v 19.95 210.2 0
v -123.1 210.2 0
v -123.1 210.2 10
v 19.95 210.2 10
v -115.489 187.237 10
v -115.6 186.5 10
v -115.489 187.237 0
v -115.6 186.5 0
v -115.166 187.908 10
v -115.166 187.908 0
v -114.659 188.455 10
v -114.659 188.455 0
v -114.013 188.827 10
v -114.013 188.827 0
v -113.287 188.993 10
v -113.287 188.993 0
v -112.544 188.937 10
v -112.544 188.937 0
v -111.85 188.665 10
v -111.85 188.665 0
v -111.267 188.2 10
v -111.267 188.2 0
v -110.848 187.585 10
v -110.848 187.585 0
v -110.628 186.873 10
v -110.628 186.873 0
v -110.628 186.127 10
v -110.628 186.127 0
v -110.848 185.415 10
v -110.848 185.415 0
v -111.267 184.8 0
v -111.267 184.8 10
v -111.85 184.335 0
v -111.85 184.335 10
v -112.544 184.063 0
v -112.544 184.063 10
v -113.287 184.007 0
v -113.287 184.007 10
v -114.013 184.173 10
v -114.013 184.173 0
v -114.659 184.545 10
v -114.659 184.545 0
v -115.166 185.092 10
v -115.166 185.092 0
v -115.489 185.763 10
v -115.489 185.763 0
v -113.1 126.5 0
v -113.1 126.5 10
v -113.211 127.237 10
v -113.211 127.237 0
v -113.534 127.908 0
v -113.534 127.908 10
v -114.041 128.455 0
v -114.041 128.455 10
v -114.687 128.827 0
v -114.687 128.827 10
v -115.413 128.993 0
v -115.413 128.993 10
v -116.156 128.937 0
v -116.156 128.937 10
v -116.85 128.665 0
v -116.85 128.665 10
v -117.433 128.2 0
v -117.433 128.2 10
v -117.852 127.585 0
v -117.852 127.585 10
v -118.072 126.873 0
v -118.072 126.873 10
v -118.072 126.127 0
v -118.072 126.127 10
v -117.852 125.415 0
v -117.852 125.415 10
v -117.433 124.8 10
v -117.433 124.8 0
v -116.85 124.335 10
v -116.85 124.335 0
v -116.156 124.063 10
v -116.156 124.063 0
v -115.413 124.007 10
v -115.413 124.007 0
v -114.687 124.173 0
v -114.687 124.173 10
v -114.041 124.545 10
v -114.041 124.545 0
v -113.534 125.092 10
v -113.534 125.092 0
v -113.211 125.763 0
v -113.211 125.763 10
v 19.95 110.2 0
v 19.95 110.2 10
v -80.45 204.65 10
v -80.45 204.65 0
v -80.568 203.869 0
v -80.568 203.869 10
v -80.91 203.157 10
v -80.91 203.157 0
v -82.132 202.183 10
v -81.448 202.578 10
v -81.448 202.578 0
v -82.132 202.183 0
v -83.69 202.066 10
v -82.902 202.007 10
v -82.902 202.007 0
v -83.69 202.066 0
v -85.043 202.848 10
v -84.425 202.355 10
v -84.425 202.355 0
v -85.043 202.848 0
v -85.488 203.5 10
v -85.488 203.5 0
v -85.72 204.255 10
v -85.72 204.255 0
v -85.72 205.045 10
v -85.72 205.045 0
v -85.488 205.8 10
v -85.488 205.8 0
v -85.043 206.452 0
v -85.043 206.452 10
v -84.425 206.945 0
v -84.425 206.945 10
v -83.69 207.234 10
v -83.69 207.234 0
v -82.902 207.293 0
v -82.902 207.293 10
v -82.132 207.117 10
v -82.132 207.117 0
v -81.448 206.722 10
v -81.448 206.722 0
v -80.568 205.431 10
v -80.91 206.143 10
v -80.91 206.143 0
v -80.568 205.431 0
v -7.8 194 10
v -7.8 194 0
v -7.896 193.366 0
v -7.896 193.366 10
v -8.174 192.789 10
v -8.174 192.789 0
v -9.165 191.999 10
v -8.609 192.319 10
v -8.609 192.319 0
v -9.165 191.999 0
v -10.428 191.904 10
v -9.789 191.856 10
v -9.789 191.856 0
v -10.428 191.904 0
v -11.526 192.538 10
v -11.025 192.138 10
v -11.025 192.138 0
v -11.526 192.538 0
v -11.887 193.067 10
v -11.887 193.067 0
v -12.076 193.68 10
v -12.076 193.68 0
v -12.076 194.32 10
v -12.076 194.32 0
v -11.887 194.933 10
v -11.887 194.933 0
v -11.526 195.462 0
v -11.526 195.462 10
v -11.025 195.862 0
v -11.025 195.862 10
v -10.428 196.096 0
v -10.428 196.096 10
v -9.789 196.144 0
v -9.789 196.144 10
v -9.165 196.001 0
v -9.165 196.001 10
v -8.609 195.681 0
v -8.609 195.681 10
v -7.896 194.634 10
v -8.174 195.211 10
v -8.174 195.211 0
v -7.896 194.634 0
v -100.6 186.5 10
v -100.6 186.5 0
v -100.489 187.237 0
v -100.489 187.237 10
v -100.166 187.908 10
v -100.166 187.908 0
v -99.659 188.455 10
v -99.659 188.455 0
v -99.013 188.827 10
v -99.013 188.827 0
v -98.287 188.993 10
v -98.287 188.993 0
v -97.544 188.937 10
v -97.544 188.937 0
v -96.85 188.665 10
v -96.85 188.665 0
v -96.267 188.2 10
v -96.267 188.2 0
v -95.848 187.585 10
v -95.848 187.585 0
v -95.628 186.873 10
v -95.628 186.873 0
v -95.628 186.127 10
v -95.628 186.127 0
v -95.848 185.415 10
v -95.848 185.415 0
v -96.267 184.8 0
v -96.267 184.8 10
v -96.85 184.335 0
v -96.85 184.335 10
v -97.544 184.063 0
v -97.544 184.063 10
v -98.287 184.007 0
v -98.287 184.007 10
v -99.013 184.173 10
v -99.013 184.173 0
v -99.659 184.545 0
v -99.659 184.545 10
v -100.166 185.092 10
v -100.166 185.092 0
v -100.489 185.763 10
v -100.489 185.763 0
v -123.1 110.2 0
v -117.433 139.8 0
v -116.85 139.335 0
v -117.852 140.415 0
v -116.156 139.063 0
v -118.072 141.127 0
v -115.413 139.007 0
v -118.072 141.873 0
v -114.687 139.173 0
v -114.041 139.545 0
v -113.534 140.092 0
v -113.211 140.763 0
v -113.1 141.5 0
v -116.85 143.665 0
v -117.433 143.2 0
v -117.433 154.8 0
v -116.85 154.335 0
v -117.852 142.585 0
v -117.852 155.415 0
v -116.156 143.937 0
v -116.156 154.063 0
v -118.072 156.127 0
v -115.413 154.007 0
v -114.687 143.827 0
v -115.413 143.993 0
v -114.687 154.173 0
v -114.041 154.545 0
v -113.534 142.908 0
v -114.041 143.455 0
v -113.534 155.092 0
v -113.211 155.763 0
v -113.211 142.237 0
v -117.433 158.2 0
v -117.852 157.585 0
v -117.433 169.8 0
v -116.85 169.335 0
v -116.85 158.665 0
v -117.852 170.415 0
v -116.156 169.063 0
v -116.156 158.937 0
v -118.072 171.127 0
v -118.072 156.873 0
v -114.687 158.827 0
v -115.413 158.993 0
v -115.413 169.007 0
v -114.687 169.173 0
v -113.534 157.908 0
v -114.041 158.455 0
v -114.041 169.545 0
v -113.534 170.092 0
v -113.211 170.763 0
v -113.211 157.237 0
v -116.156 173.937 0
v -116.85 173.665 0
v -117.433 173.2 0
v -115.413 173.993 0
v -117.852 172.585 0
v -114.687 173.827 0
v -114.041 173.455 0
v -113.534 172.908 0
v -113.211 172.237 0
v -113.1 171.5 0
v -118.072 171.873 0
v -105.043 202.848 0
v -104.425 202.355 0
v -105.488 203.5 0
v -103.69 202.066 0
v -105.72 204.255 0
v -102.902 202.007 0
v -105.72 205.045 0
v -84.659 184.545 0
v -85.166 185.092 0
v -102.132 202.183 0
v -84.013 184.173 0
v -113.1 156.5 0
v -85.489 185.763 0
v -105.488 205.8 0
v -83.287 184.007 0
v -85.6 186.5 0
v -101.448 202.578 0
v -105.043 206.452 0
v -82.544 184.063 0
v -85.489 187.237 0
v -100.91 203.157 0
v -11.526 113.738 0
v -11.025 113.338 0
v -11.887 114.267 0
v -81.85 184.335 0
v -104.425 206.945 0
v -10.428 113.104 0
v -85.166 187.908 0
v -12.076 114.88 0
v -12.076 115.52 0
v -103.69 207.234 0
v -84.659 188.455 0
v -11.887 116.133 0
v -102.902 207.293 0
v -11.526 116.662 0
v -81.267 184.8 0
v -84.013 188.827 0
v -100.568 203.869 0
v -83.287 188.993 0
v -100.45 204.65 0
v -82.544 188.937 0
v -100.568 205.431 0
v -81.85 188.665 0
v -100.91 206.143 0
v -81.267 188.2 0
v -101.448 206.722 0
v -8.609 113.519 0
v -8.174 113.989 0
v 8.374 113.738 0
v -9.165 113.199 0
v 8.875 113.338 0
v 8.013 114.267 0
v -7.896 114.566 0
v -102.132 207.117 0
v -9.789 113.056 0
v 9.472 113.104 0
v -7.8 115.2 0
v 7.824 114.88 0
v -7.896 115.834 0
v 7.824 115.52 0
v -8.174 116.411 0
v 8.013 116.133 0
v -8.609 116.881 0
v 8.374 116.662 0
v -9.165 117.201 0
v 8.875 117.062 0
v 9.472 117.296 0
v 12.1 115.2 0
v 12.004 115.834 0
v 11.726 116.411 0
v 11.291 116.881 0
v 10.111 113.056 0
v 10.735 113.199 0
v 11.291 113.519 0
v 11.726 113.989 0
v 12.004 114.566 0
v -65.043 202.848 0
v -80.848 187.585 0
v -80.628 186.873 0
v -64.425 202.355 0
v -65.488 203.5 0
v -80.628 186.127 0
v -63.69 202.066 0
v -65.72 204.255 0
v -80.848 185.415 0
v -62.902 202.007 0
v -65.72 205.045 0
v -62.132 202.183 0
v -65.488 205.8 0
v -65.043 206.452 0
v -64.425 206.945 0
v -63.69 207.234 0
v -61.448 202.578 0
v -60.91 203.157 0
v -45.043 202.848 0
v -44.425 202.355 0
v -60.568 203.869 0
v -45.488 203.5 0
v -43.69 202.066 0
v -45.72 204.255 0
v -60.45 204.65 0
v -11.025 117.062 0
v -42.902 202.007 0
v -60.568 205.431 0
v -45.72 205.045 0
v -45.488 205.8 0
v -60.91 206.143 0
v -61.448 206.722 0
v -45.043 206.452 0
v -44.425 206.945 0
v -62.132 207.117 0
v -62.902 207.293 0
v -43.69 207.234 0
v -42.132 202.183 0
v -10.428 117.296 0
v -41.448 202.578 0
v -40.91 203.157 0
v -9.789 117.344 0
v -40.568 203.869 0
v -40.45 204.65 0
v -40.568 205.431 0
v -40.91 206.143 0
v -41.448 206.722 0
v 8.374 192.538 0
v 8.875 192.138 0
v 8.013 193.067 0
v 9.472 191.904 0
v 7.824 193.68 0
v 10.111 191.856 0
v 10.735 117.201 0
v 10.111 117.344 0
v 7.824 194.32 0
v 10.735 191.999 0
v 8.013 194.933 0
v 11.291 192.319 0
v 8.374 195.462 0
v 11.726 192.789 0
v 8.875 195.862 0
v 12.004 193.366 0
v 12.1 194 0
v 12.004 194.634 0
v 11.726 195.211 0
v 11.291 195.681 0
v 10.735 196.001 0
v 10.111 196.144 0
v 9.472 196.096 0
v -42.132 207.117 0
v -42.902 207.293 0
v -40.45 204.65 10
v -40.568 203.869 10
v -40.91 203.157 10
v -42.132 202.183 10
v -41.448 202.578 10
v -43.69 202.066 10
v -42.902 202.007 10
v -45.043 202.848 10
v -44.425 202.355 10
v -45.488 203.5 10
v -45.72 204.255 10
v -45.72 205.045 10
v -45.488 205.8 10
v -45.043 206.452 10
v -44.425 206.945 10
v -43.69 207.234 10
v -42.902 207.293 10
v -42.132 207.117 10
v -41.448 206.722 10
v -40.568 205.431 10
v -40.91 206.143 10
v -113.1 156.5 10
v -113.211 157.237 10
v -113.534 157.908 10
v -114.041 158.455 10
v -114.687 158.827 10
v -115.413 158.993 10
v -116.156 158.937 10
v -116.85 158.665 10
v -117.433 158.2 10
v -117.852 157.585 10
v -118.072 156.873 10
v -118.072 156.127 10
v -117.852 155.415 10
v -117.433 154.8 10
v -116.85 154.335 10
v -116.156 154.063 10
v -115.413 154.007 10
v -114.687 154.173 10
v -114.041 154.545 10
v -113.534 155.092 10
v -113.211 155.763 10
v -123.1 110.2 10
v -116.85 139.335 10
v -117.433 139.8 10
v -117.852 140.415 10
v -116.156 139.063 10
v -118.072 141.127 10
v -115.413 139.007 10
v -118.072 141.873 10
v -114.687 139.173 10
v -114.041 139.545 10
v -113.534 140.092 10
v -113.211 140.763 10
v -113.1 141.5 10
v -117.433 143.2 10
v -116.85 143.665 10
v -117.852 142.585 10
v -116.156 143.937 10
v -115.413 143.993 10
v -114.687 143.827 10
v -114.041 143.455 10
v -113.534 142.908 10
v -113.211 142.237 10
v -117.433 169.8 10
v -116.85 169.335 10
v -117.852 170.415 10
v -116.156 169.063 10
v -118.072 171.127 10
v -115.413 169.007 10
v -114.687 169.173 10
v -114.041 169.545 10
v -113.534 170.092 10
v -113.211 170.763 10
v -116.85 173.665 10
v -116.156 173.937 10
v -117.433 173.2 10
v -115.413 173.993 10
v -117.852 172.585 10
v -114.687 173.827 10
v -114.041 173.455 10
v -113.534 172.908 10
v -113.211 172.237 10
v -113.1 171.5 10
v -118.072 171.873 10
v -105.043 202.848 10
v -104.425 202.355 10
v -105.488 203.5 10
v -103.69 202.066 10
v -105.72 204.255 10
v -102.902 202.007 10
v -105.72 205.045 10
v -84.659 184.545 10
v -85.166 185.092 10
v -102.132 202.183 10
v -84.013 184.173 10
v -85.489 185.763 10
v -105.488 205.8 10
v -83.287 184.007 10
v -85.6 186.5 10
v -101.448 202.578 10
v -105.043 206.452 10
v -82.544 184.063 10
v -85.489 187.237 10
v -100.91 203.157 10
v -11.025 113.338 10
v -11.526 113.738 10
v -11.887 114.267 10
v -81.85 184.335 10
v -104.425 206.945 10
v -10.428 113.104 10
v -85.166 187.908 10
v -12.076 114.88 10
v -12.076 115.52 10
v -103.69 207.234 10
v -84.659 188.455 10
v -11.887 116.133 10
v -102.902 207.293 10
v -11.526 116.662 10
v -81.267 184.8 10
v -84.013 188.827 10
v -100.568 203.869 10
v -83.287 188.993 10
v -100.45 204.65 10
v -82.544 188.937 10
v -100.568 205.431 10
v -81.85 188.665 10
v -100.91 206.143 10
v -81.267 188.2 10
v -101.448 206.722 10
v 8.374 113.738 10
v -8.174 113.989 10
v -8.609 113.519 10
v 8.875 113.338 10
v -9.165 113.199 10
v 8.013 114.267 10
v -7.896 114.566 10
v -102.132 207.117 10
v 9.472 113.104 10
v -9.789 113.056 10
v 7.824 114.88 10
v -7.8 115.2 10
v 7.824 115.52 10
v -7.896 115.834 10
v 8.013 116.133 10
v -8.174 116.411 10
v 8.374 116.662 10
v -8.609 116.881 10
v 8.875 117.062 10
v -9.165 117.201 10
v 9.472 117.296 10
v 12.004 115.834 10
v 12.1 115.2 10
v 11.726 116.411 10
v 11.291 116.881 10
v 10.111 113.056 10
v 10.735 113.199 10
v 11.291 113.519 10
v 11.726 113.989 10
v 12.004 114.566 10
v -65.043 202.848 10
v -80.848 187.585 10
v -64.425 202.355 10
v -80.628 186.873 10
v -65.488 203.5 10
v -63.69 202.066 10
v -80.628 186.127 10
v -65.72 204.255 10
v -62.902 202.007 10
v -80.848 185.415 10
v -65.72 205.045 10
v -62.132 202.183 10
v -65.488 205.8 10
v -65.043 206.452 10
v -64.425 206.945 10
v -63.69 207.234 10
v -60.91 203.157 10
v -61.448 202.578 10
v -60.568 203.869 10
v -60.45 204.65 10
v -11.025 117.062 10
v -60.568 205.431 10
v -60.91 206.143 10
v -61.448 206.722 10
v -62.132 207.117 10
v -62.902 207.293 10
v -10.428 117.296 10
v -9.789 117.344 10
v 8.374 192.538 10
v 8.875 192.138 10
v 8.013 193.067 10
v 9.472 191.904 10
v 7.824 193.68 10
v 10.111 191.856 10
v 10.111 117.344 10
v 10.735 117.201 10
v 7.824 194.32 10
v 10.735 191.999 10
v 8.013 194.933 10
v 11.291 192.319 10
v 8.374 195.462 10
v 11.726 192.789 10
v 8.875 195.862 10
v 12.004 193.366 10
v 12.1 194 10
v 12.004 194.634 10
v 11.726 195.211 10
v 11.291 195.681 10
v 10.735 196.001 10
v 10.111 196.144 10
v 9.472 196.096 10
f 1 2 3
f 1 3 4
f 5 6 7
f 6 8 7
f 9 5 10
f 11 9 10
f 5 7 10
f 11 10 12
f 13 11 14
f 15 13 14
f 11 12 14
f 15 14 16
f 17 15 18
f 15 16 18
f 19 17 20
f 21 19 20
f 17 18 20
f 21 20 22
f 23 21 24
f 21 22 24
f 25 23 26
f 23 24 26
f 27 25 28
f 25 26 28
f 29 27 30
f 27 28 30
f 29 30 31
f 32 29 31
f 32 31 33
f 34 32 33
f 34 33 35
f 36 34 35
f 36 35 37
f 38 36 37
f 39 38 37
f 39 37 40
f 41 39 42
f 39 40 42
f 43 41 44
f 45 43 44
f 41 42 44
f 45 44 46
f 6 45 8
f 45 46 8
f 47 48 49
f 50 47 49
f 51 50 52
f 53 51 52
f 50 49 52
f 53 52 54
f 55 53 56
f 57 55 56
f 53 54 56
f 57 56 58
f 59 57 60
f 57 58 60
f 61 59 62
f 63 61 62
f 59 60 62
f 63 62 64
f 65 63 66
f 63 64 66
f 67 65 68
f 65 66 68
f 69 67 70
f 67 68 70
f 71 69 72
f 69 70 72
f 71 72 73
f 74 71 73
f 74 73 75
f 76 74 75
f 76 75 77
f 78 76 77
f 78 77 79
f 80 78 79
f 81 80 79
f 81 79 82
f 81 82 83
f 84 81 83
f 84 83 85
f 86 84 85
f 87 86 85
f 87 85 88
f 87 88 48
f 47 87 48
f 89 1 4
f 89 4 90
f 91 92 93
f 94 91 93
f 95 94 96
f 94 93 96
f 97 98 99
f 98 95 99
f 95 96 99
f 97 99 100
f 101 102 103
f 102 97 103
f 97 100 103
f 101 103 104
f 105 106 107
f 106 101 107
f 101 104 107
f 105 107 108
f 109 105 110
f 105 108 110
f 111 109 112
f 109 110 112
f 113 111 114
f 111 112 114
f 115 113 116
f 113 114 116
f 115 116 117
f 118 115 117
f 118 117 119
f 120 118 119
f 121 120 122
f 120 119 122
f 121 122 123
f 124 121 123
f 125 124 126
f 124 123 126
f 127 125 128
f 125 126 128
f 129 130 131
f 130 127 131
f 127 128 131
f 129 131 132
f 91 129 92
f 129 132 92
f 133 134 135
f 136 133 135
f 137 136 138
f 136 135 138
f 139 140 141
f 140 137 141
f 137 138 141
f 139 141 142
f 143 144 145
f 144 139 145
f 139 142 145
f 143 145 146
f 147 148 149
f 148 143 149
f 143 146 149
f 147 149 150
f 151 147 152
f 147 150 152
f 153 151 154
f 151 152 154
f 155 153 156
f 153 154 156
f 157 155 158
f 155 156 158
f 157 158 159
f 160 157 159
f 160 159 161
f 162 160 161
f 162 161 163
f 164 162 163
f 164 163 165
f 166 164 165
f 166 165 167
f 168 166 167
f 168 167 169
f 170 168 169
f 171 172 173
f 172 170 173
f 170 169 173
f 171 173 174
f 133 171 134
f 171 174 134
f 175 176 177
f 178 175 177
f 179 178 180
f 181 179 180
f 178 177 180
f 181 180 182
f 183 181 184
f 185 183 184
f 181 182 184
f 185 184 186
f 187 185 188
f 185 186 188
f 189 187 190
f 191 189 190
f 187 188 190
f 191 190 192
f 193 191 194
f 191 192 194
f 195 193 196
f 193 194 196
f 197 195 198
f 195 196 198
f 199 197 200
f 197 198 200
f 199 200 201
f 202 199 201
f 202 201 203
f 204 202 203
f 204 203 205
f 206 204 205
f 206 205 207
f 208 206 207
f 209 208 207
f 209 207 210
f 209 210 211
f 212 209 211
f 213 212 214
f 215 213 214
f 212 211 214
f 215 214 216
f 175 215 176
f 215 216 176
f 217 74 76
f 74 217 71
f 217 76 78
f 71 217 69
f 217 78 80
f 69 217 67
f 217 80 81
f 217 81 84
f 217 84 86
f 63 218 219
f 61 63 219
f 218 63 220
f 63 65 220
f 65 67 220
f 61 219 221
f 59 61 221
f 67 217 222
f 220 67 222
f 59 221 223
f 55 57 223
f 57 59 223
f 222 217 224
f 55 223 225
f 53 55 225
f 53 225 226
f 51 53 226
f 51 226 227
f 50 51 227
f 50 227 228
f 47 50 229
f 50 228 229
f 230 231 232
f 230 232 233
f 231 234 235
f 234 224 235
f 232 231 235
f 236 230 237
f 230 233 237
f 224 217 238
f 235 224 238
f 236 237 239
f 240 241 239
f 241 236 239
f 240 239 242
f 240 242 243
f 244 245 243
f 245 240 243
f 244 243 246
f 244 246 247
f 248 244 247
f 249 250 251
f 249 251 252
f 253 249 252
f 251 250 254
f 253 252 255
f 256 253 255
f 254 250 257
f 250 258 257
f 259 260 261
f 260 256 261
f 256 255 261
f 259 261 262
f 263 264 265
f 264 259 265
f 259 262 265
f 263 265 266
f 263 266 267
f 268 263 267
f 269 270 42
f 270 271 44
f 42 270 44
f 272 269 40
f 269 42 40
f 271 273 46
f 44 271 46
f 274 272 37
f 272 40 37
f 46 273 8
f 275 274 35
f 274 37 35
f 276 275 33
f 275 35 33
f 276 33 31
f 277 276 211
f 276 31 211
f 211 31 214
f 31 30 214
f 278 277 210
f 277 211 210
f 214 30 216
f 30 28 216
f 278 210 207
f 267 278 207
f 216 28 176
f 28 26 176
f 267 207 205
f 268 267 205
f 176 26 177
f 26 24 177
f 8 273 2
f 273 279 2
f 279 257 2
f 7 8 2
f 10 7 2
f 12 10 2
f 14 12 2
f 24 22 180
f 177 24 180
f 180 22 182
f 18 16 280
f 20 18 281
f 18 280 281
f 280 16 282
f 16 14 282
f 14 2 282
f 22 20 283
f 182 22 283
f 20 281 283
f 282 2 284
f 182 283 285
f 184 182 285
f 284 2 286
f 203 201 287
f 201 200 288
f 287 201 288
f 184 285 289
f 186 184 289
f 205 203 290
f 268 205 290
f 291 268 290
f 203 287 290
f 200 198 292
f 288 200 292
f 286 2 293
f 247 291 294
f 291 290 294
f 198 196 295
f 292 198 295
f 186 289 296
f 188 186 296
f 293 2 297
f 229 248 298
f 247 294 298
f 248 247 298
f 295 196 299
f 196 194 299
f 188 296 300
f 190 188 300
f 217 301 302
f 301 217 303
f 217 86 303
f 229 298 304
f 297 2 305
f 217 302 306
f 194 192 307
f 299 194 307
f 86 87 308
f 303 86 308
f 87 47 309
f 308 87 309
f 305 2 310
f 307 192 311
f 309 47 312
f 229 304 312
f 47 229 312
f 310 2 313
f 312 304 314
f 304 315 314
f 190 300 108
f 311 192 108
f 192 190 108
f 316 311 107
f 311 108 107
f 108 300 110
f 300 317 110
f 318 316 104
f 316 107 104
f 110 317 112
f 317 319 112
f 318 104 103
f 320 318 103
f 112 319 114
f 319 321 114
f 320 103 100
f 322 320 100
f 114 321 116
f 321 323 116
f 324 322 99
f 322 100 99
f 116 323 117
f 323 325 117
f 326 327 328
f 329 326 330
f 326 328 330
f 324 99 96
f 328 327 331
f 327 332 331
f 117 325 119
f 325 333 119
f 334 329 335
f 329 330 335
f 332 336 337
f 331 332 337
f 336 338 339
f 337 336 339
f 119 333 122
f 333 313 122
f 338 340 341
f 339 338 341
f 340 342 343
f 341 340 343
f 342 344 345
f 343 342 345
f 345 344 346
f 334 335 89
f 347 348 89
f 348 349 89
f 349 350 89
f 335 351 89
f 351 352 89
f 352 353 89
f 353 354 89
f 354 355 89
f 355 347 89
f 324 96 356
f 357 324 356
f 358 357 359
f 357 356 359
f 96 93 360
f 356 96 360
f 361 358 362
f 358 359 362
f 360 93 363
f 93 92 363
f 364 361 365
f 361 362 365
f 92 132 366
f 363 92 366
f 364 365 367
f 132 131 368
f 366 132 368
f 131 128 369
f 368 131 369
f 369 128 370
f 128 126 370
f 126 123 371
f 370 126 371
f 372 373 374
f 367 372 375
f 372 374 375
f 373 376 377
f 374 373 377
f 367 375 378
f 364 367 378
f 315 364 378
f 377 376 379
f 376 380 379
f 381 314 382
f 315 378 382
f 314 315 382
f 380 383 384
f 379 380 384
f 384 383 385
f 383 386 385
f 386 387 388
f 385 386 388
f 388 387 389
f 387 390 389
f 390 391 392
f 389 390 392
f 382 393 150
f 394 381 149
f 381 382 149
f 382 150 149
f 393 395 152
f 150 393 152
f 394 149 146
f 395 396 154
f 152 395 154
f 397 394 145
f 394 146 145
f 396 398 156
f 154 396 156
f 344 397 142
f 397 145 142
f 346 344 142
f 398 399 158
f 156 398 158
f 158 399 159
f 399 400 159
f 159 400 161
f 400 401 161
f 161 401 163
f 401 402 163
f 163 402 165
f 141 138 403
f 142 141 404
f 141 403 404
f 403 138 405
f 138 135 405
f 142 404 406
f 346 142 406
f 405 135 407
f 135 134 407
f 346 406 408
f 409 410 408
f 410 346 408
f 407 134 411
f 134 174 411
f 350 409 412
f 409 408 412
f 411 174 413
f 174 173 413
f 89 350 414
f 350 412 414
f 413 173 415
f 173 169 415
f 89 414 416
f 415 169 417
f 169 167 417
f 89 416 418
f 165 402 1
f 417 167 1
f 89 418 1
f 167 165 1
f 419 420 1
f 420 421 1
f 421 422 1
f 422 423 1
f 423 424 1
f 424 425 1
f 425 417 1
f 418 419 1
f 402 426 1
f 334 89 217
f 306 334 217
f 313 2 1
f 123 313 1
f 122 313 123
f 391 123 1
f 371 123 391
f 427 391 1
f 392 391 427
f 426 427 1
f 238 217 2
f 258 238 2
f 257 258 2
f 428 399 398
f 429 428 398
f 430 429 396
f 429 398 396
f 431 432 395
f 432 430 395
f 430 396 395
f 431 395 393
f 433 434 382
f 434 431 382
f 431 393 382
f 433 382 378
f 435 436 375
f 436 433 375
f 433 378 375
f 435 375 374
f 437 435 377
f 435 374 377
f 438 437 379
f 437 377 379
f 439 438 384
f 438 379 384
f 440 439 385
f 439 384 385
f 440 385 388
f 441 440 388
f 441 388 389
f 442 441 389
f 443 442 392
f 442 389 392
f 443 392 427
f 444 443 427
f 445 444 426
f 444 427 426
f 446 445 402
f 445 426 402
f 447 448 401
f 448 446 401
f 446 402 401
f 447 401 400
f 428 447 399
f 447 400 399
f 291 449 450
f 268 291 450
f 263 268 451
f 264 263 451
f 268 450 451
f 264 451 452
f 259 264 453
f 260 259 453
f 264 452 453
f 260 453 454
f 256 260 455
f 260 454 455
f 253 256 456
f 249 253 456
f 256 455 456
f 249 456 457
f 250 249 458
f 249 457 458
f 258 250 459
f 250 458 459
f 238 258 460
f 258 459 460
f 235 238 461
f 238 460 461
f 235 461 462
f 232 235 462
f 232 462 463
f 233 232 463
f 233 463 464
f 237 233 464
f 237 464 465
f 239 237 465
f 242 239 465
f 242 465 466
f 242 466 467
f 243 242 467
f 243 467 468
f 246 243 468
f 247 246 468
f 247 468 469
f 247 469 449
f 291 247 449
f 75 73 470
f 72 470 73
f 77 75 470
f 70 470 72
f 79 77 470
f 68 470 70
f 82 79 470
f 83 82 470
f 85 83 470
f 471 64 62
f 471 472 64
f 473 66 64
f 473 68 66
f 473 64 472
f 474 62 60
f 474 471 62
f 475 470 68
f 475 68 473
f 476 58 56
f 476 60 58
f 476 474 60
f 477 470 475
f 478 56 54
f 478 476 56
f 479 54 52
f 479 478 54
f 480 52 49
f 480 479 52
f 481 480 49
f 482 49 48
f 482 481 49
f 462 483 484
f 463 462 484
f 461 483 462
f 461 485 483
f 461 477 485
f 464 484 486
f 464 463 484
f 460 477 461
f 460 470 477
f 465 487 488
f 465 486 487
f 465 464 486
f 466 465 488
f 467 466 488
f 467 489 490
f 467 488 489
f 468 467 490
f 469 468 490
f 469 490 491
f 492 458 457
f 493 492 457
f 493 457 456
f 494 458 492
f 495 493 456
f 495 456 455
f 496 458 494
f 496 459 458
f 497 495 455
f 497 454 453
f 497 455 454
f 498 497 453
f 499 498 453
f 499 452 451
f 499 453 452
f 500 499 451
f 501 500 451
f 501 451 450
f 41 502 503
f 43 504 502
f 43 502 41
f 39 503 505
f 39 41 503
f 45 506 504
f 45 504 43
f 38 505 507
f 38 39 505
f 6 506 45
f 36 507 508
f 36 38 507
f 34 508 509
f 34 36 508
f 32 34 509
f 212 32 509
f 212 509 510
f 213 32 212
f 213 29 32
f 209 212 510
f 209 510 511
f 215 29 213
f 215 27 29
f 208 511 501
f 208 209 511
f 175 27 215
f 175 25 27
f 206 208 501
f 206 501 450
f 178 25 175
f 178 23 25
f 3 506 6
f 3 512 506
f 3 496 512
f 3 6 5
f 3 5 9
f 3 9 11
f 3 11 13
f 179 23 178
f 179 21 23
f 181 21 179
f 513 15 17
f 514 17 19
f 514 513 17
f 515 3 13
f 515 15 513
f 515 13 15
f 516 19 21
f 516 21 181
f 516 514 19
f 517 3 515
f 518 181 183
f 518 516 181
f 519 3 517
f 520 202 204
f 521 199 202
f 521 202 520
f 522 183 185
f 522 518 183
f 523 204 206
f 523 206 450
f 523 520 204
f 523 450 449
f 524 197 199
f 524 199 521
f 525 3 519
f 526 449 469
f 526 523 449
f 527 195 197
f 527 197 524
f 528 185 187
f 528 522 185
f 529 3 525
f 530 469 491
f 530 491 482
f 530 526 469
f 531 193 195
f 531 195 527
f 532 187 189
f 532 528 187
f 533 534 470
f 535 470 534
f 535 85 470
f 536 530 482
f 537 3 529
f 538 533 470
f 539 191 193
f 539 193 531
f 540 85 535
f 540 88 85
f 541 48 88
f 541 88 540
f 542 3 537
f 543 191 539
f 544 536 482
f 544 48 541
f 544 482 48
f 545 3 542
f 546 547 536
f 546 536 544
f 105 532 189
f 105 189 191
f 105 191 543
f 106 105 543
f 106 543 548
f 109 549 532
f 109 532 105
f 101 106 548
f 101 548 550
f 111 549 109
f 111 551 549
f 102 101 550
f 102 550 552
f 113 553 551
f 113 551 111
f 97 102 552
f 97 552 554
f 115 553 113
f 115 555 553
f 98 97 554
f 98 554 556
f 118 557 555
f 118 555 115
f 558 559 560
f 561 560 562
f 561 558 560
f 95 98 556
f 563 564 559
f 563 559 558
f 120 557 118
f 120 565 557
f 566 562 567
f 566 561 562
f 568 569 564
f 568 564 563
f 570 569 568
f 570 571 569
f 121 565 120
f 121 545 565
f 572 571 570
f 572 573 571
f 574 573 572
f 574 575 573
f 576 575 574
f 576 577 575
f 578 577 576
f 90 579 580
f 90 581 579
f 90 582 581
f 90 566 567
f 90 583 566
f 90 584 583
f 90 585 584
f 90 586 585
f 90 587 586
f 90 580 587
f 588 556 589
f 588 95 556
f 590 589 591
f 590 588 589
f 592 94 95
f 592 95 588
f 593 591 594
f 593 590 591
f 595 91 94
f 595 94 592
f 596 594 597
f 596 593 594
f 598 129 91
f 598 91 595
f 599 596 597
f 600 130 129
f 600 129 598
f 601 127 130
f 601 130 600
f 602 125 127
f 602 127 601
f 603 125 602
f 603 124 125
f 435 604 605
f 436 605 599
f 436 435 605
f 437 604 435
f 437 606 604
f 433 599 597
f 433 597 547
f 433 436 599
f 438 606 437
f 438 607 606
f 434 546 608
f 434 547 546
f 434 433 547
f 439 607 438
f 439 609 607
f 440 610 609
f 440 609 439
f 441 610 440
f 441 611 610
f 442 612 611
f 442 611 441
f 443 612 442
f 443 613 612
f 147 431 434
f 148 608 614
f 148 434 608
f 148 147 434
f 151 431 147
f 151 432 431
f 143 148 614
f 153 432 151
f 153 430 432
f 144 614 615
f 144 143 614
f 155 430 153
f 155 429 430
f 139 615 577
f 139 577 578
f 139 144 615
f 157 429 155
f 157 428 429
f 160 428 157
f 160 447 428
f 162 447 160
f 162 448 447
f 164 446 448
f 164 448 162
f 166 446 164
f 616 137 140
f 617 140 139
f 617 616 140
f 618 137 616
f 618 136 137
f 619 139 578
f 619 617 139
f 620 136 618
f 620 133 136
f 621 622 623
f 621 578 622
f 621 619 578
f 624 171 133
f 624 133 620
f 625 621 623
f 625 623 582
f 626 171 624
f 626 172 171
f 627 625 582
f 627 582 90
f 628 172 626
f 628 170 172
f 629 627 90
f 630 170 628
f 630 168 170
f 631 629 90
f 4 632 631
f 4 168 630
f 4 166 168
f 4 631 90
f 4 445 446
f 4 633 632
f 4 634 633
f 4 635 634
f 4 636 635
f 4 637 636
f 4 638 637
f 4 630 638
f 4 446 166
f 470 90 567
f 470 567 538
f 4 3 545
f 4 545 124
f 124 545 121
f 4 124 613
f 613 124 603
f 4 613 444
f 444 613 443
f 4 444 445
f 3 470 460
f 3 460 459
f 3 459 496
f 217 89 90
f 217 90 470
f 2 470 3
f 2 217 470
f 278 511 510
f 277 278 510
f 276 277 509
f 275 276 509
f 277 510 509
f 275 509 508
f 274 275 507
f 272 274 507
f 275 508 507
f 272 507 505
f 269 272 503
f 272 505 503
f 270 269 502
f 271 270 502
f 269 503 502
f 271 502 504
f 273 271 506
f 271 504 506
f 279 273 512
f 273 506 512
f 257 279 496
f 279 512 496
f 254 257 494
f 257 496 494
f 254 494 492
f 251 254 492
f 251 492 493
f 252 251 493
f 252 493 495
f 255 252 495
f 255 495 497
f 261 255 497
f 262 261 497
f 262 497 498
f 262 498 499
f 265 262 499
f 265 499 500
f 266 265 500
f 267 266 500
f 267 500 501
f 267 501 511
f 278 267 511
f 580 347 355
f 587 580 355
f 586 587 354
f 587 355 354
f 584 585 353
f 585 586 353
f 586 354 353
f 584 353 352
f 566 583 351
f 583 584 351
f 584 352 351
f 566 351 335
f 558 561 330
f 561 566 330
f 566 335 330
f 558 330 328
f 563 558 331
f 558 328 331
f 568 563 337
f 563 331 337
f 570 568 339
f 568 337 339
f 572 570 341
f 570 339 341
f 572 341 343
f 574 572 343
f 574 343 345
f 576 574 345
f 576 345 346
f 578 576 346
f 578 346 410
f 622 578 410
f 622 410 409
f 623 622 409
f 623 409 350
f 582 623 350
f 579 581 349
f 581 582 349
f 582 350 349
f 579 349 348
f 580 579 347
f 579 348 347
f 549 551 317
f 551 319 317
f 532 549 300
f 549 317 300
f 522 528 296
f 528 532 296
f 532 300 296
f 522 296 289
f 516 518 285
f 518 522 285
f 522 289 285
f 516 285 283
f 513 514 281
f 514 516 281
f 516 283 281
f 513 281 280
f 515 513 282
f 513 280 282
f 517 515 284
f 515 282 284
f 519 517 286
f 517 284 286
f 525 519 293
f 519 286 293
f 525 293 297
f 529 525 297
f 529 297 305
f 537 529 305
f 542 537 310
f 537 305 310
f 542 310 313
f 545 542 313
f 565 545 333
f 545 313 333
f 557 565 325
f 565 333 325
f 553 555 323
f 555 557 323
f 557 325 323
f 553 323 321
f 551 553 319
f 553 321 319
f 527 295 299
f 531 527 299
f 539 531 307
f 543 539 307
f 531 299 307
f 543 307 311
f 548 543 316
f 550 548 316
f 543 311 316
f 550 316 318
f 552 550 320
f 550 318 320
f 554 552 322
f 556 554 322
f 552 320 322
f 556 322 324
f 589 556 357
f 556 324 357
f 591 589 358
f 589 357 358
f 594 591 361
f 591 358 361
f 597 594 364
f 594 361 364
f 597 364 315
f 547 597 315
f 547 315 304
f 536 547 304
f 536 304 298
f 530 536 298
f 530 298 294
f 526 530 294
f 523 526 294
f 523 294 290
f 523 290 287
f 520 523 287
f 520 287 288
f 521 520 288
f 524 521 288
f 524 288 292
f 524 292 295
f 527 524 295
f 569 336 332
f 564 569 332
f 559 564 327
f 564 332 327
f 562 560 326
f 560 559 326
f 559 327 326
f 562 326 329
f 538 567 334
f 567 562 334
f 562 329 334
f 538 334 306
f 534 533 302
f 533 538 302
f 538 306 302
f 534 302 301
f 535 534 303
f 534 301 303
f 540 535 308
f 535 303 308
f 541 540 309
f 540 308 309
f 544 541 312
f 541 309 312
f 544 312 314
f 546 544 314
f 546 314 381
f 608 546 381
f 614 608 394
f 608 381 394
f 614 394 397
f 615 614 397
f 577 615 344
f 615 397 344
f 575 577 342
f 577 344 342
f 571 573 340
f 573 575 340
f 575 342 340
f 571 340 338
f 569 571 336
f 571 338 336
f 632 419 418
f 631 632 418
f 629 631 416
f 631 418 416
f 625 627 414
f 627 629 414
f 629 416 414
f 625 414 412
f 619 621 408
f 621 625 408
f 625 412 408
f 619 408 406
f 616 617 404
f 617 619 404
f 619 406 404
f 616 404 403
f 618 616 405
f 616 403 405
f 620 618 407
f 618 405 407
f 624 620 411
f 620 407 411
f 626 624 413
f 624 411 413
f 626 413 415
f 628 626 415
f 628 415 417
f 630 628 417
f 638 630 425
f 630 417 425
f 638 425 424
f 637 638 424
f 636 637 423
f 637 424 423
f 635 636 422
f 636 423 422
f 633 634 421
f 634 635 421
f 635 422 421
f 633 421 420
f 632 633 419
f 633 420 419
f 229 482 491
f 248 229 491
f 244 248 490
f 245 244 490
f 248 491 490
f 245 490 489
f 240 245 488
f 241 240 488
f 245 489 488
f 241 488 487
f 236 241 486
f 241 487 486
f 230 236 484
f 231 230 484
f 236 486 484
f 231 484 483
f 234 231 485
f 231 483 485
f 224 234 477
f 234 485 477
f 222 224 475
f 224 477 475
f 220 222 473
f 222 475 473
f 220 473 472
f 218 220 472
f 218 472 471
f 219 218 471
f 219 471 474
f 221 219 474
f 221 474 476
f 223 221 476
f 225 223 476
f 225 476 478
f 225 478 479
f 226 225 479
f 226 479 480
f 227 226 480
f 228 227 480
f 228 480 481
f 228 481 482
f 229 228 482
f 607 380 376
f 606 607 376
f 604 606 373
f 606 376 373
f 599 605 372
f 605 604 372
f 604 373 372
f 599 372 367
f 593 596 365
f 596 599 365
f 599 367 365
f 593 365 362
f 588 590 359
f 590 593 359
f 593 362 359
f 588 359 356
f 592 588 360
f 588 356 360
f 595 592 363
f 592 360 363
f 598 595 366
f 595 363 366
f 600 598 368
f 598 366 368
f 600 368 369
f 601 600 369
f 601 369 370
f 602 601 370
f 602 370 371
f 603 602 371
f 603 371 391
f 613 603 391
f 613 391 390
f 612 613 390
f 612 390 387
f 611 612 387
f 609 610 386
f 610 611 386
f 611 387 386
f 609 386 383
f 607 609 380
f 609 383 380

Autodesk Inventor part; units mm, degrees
ref_plane "YZ Plane" through (0, 0, 0) normal (1, 0, 0) x (0, 1, 0)
ref_plane "XZ Plane" through (0, 0, 0) normal (0, 1, 0) x (-1, 0, 0)
ref_plane "XY Plane" through (0, 0, 0) normal (0, 0, 1) x (1, 0, 0)
ref_plane "Work Plane1" through (0, 0, 0) normal (0, 0, 1) x (1, 0, 0)
sketch "Sketch1" plane through (0, 0, 0) normal (0, 0, 1) x (1, 0, 0)
  line L0 (-28.1, 210.2) -> (-28.1, 202.1) construction
  line L1 (-28.1, 202.1) -> (-23.1, 202.1) construction
  line L2 (-23.1, 199.1) -> (-23.1, 202.1) construction
  line L3 (-23.1, 199.1) -> (-123.1, 199.1) construction
  line L4 (-123.1, 199.1) -> (-123.1, 210.2) construction
  line L5 (-28.1, 210.2) -> (-123.1, 210.2) construction
  line L6 (-23.1, -199.1) -> (-23.1, -210.2) construction
  line L7 (-23.1, -210.2) -> (-123.1, -210.2) construction
  line L8 (-123.1, -199.1) -> (-123.1, -210.2) construction
  line L9 (-23.1, -199.1) -> (-123.1, -199.1) construction
  line L10 (23, -210.2) -> (-23, -210.2) construction
  line L11 (-23, -210.2) -> (-23, -202.2) construction
  line L12 (23, -202.2) -> (-23, -202.2) construction
  line L13 (23, -210.2) -> (23, -202.2) construction
  line L14 (28, 202.2) -> (-28, 202.2) construction
  line L15 (-28, 202.2) -> (-28, 210.2) construction
  line L16 (28, 210.2) -> (-28, 210.2) construction
  line L17 (28, 202.2) -> (28, 210.2) construction
  line L18 (7.95, 199) -> (7.95, -199) construction
  line L19 (7.95, -199) -> (-7.95, -199) construction
  line L20 (-7.95, -199) -> (-7.95, 199) construction
  line L21 (-7.95, 199) -> (7.95, 199) construction
  line L22 (-11.95, 199) -> (-11.95, -199) construction
  line L23 (-11.95, -199) -> (-19.95, -199) construction
  line L24 (-19.95, -199) -> (-19.95, 199) construction
  line L25 (-19.95, 199) -> (-11.95, 199) construction
  line L26 (11.95, -199) -> (11.95, 199) construction
  line L27 (11.95, 199) -> (19.95, 199) construction
  line L28 (19.95, 199) -> (19.95, -199) construction
  line L29 (19.95, -199) -> (11.95, -199) construction
  line L30 (-123.1, 210.2) -> (19.95, 210.2)
  line L31 (19.95, 210.2) -> (19.95, 110.2)
  line L32 (19.95, 110.2) -> (-123.1, 110.2)
  line L33 (-123.1, 110.2) -> (-123.1, 210.2)
  circle A0 centre (-9.95, 115.2) radius 2.15
  circle A1 centre (9.95, 115.2) radius 2.15
  circle A2 centre (9.95, 194) radius 2.15
  circle A3 centre (-9.95, 194) radius 2.15
  line L34 (-11.95, 155.8556) -> (-7.95, 155.8556) construction
  line L35 (7.95, 155.8556) -> (11.95, 155.8556) construction
  line L36 (-9.95, 155.8556) -> (-9.95, 110.2) construction
  line L37 (9.95, 155.8556) -> (9.95, 110.2) construction
  line L38 (-89.6001, 199.1) -> (-89.6001, 210.2) construction
  line L39 (-89.6001, 204.65) -> (-123.1, 204.65) construction
  circle A4 centre (-103.1, 204.65) radius 2.65
  circle A5 centre (-83.1, 204.65) radius 2.65
  circle A6 centre (-63.1, 204.65) radius 2.65
  circle A7 centre (-43.1, 204.65) radius 2.65
  point P0 (0, 0)
extrude "Extrusion1" add sketch "Sketch1" along normal blind 10
sketch "Sketch2" plane through (0, 0, 0) normal (0, 0, -1) x (-1, 0, 0)
  circle A0 centre (83.1, 186.5) radius 2.65 construction
  circle A1 centre (98.1, 186.5) radius 2.65 construction
  circle A2 centre (113.1, 186.5) radius 2.65 construction
  circle A3 centre (83.1, 186.5) radius 2.5
  circle A4 centre (98.1, 186.5) radius 2.5
  circle A5 centre (113.1, 186.5) radius 2.5
  point P0 (0, 0)
  dimension "d20" = 5
  dimension "d21" = 5
  dimension "d22" = 5
extrude "Extrusion2" cut sketch "Sketch2" against normal through all
sketch "Sketch3" plane through (0, 0, 10) normal (0, 0, 1) x (1, 0, 0)
  circle A0 centre (-115.6, 141.5) radius 2.65 construction
  circle A1 centre (-115.6, 156.5) radius 2.65 construction
  circle A2 centre (-115.6, 126.5) radius 2.65 construction
  circle A3 centre (-115.6, 171.5) radius 2.65 construction
  arc A4 (-111.2, 191.1249) -> (-111.2, 181.8751) centre (-113.1, 186.5) ccw construction
  line L0 (-111.2, 264.8) -> (-111.2, 191.1249) construction
  line L1 (-111.2, 264.8) -> (-223.2, 264.8) construction
  line L2 (-223.2, 105.1) -> (-223.2, 264.8) construction
  line L3 (-223.2, 105.1) -> (-111.2, 105.1) construction
  line L4 (-111.2, 181.8751) -> (-111.2, 105.1) construction
  circle A5 centre (-115.6, 171.5) radius 2.5
  circle A6 centre (-115.6, 156.5) radius 2.5
  circle A7 centre (-115.6, 141.5) radius 2.5
  circle A8 centre (-115.6, 126.5) radius 2.5
  point P0 (0, 0)
  dimension "d25" = 5
  dimension "d28" = 15
extrude "Extrusion3" cut sketch "Sketch3" against normal through all
equation "\"d2\" = d1"
equation "\"d3\" = d1"
equation "\"d4\" = d1"
equation "\"d6\" = d5"
equation "\"d7\" = d5"
equation "\"d8\" = d5"
equation "\"d1\" = 4.3"
equation "\"d5\" = 5"
properties part number "backboard"
